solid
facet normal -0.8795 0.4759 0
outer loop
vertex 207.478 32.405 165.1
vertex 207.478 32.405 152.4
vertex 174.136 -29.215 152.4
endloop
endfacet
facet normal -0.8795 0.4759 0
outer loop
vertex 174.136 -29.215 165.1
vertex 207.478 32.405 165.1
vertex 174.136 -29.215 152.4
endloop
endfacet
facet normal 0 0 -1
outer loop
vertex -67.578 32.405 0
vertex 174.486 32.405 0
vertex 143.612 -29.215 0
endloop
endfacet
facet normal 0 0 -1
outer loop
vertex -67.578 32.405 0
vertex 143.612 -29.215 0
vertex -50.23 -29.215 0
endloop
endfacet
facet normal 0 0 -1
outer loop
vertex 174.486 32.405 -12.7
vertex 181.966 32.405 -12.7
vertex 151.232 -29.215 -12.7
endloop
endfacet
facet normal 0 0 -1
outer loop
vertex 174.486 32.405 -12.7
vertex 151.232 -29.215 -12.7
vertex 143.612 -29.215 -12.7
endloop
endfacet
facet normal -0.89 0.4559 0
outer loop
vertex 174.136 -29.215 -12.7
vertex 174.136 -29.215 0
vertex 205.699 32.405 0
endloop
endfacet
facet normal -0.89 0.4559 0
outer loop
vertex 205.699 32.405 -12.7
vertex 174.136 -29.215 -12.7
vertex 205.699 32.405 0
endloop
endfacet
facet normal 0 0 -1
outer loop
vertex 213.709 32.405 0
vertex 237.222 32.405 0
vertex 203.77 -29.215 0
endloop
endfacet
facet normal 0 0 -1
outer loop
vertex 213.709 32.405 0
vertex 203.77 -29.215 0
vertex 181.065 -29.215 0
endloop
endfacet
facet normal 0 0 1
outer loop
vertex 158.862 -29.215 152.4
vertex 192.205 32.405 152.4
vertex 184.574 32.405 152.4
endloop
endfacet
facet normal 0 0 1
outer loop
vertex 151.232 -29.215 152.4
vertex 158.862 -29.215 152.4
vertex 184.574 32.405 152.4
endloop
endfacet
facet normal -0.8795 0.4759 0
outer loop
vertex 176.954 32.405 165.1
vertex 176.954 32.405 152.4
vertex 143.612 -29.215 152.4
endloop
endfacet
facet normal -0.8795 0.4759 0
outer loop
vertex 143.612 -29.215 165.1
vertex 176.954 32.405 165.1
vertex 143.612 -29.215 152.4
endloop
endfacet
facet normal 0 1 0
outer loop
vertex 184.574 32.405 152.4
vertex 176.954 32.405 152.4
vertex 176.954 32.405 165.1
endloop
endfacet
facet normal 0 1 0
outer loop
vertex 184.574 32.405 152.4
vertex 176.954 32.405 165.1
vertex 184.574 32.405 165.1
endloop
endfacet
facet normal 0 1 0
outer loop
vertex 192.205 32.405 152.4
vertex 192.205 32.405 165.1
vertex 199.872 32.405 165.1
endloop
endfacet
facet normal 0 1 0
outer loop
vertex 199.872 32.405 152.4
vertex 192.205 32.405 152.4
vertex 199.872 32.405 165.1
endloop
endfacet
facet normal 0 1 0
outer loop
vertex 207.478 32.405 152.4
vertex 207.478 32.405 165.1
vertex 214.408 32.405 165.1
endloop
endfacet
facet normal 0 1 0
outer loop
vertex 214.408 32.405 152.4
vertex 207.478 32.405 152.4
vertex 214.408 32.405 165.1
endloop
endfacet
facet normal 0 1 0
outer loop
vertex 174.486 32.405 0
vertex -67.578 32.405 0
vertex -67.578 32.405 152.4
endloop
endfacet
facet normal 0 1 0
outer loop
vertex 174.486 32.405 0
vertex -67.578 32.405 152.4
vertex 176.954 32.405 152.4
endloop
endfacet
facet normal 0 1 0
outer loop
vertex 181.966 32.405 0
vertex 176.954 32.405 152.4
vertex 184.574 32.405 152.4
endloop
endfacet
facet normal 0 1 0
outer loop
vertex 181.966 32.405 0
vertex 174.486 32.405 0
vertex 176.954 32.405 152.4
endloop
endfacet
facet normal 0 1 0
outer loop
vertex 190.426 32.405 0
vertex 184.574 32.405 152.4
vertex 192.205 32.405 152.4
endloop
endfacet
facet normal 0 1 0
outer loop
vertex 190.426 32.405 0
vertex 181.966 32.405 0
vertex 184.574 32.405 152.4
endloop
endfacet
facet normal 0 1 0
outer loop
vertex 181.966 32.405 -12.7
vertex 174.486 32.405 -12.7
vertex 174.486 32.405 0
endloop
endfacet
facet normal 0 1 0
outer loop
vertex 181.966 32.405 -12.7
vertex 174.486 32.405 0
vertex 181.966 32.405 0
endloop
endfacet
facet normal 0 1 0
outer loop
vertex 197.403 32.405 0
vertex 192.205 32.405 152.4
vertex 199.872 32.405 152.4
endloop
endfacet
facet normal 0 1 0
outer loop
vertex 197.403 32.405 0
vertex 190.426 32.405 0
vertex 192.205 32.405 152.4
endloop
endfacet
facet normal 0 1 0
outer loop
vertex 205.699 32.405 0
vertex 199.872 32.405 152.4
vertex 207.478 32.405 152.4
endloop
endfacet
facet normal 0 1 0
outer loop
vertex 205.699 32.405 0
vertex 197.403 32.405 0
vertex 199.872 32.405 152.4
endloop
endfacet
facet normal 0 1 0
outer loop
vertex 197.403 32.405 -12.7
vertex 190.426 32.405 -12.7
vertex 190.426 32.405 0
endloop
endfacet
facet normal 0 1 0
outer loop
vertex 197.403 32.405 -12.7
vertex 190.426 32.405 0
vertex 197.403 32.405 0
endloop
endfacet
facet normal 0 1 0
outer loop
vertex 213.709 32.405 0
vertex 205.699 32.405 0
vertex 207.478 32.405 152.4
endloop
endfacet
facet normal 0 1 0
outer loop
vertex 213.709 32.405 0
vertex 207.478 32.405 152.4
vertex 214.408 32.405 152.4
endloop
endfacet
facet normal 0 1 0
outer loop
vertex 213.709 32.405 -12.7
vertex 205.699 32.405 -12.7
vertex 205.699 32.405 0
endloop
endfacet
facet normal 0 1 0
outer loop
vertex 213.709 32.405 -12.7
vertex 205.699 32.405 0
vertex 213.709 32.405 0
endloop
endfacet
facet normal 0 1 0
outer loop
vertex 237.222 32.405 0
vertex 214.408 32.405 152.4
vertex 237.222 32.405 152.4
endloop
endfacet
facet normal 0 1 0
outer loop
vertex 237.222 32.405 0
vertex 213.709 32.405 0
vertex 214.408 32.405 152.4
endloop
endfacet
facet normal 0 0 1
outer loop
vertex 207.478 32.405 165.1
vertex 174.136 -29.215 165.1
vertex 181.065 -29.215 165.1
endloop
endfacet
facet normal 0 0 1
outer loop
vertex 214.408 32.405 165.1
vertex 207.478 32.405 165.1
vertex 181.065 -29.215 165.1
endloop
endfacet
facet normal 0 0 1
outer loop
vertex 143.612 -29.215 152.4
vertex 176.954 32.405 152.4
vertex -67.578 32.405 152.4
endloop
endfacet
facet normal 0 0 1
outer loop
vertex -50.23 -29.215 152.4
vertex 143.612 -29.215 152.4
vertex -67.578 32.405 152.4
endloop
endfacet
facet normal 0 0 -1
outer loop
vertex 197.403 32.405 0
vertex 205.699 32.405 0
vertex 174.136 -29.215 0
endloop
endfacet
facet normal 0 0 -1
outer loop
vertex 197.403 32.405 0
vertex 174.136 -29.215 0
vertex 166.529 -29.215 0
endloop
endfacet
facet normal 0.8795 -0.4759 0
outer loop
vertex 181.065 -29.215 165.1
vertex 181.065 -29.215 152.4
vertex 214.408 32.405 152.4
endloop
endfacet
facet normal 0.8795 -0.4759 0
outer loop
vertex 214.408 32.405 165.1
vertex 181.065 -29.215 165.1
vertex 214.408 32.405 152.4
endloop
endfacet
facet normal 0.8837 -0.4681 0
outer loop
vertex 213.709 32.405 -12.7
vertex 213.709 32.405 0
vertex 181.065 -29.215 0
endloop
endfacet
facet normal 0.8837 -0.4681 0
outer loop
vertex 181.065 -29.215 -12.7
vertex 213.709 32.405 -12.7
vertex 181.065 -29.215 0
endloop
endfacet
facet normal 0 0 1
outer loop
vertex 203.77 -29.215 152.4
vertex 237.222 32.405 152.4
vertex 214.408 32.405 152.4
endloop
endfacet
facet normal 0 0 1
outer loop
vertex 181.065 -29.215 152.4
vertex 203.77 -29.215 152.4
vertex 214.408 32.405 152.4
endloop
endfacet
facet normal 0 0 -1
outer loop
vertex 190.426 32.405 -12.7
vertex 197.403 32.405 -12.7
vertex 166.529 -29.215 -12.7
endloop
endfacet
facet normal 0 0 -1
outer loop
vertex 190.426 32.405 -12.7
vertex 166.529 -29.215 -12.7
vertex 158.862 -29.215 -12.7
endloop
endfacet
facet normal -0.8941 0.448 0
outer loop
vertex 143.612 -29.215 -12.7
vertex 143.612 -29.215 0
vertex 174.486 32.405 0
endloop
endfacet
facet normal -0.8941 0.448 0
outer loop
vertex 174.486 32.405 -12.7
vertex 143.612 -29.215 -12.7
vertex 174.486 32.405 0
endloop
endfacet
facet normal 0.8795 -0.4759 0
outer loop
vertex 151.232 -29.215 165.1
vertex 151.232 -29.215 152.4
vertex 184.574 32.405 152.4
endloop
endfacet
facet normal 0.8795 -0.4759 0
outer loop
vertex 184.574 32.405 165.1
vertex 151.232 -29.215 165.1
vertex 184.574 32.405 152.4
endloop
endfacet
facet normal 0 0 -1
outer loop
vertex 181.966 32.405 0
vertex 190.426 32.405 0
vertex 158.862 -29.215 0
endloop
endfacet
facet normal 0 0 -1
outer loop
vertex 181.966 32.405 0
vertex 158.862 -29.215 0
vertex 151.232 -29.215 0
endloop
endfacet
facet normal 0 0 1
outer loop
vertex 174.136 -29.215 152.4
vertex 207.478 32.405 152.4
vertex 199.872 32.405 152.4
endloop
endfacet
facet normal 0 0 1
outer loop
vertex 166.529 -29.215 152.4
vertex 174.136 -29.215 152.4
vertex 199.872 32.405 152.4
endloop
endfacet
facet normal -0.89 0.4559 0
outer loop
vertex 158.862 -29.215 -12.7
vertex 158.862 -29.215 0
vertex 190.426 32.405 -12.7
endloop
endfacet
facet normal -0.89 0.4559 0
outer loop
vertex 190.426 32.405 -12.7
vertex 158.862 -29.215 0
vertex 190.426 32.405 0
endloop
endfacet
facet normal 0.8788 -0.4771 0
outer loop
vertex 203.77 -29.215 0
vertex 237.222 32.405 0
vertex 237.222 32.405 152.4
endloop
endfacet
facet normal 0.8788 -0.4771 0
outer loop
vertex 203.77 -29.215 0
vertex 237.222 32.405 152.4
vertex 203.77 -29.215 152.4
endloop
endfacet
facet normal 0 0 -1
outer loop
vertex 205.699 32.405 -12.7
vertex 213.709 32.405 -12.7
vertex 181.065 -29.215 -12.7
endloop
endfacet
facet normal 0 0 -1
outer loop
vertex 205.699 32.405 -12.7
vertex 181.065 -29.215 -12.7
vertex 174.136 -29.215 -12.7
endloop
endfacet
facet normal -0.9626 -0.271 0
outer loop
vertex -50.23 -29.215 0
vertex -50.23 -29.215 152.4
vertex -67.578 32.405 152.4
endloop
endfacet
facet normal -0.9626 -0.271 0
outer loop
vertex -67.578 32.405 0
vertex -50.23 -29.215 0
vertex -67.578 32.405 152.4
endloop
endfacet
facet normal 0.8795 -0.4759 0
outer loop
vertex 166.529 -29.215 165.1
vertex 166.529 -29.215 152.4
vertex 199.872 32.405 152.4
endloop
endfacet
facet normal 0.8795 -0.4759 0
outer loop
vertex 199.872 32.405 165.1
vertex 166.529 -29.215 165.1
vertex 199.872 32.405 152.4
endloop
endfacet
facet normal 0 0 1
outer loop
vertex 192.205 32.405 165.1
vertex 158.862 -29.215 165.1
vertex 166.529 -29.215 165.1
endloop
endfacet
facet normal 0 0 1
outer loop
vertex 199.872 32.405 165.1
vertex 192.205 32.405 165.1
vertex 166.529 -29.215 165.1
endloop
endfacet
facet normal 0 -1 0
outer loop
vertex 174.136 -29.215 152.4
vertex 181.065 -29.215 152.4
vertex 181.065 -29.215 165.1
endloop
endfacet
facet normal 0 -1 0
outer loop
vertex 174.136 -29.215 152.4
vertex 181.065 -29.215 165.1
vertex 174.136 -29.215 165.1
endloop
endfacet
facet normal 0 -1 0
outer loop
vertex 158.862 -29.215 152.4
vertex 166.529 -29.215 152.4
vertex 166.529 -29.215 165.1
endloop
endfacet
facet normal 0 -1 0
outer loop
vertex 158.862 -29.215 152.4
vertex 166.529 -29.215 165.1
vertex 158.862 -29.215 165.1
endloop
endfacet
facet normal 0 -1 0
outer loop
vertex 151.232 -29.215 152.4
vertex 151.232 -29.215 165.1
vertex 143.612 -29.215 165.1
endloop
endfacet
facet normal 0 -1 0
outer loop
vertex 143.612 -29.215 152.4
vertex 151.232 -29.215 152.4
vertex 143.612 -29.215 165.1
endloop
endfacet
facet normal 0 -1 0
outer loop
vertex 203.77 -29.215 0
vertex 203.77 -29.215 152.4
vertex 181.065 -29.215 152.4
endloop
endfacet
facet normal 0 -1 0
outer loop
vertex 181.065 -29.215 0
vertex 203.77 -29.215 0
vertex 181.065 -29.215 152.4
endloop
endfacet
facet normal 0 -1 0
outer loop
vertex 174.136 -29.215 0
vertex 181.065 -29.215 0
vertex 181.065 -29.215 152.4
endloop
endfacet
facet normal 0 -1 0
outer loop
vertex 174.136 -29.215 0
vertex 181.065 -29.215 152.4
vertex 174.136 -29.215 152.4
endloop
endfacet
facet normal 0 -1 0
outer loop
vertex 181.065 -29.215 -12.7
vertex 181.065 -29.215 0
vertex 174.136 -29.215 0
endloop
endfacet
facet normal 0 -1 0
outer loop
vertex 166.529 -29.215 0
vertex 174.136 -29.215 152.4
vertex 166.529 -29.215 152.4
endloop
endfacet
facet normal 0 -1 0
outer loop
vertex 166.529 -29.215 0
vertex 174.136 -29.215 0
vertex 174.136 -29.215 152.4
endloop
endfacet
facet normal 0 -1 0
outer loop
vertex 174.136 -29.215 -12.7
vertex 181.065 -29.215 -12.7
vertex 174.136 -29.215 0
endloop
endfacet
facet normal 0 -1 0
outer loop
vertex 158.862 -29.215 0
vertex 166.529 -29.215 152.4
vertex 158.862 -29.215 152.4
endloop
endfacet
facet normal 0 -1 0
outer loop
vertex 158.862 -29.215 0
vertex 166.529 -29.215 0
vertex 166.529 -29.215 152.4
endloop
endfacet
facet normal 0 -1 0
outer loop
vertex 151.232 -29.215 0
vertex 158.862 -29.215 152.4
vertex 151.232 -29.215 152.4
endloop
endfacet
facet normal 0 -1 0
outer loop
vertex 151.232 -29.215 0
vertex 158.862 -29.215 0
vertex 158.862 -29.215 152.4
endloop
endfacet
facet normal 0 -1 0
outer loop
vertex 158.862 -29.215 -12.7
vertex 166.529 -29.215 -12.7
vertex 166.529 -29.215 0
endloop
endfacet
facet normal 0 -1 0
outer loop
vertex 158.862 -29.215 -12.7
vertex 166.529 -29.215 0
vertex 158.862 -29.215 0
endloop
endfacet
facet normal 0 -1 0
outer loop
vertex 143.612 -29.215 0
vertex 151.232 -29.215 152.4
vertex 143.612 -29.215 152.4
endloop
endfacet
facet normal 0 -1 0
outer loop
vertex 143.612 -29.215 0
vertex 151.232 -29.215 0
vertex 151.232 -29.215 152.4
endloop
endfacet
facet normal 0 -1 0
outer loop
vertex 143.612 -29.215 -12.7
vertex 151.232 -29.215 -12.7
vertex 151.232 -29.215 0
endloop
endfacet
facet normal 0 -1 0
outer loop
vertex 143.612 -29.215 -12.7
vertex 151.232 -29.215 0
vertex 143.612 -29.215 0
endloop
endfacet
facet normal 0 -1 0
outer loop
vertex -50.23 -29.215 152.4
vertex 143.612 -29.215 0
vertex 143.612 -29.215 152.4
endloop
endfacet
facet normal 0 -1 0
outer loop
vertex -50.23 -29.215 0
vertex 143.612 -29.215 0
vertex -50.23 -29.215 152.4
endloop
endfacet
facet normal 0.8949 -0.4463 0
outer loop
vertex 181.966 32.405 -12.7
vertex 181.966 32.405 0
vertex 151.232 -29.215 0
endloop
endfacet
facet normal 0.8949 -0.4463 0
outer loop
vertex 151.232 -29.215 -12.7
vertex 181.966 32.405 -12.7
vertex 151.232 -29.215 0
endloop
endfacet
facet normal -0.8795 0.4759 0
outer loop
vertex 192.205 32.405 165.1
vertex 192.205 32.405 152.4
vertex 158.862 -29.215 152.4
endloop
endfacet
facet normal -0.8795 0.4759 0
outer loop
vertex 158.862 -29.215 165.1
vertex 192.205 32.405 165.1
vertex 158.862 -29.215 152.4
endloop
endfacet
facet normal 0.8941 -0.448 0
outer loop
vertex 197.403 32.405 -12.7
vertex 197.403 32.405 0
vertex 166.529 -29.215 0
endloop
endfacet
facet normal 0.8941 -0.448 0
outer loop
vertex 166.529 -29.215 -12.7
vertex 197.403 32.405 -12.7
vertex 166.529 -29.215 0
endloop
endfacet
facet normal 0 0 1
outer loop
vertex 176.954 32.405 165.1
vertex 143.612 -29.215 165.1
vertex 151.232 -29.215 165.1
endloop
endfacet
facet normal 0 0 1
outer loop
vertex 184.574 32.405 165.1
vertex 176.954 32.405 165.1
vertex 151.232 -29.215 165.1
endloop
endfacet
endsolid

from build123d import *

# Parameters (mm, degrees)
BOSS_EXTRUDE1_DEPTH = 152.4
BOSS_EXTRUDE2_DEPTH = 12.7
BOSS_EXTRUDE4_DEPTH = 12.7


with BuildPart() as part:
    # Sketch1 → Boss-Extrude1 (new body)
    with BuildSketch(Plane.XY):
        Polygon((-67.57780806, 32.405365497), (237.22219194, 32.405365497), (203.770487766, -29.214920061), (-50.229512234, -29.214920061), align=None)
    extrude(amount=BOSS_EXTRUDE1_DEPTH)

    # Sketch2 → Boss-Extrude2 (add)
    with BuildSketch(Plane.XY.offset(152.4)):
        Polygon((181.065122105, -29.214920061), (214.407517956, 32.405365497), (207.478022529, 32.405365497), (174.135626677, -29.214920061), align=None)
        Polygon((166.529193842, -29.214920061), (199.871589694, 32.405365497), (192.204880741, 32.405365497), (158.862484889, -29.214920061), align=None)
        Polygon((151.231941607, -29.214920061), (184.574337458, 32.405365497), (176.954337458, 32.405365497), (143.611941607, -29.214920061), align=None)
    extrude(amount=BOSS_EXTRUDE2_DEPTH)

    # Sketch4 → Boss-Extrude4 (add)
    with BuildSketch(Plane(origin=(0, 0, 0), x_dir=(-1, 0, 0), z_dir=(0, 0, -1))):
        Polygon((-181.966188402, 32.405365497), (-151.231941607, -29.214920061), (-143.611941607, -29.214920061), (-174.485930726, 32.405365497), align=None)
        Polygon((-197.403182961, 32.405365497), (-166.529193842, -29.214920061), (-158.862484889, -29.214920061), (-190.426148903, 32.405365497), align=None)
        Polygon((-213.709292703, 32.405365497), (-181.065122105, -29.214920061), (-174.135626677, -29.214920061), (-205.699290692, 32.405365497), align=None)
    extrude(amount=BOSS_EXTRUDE4_DEPTH)


solid = part.part
